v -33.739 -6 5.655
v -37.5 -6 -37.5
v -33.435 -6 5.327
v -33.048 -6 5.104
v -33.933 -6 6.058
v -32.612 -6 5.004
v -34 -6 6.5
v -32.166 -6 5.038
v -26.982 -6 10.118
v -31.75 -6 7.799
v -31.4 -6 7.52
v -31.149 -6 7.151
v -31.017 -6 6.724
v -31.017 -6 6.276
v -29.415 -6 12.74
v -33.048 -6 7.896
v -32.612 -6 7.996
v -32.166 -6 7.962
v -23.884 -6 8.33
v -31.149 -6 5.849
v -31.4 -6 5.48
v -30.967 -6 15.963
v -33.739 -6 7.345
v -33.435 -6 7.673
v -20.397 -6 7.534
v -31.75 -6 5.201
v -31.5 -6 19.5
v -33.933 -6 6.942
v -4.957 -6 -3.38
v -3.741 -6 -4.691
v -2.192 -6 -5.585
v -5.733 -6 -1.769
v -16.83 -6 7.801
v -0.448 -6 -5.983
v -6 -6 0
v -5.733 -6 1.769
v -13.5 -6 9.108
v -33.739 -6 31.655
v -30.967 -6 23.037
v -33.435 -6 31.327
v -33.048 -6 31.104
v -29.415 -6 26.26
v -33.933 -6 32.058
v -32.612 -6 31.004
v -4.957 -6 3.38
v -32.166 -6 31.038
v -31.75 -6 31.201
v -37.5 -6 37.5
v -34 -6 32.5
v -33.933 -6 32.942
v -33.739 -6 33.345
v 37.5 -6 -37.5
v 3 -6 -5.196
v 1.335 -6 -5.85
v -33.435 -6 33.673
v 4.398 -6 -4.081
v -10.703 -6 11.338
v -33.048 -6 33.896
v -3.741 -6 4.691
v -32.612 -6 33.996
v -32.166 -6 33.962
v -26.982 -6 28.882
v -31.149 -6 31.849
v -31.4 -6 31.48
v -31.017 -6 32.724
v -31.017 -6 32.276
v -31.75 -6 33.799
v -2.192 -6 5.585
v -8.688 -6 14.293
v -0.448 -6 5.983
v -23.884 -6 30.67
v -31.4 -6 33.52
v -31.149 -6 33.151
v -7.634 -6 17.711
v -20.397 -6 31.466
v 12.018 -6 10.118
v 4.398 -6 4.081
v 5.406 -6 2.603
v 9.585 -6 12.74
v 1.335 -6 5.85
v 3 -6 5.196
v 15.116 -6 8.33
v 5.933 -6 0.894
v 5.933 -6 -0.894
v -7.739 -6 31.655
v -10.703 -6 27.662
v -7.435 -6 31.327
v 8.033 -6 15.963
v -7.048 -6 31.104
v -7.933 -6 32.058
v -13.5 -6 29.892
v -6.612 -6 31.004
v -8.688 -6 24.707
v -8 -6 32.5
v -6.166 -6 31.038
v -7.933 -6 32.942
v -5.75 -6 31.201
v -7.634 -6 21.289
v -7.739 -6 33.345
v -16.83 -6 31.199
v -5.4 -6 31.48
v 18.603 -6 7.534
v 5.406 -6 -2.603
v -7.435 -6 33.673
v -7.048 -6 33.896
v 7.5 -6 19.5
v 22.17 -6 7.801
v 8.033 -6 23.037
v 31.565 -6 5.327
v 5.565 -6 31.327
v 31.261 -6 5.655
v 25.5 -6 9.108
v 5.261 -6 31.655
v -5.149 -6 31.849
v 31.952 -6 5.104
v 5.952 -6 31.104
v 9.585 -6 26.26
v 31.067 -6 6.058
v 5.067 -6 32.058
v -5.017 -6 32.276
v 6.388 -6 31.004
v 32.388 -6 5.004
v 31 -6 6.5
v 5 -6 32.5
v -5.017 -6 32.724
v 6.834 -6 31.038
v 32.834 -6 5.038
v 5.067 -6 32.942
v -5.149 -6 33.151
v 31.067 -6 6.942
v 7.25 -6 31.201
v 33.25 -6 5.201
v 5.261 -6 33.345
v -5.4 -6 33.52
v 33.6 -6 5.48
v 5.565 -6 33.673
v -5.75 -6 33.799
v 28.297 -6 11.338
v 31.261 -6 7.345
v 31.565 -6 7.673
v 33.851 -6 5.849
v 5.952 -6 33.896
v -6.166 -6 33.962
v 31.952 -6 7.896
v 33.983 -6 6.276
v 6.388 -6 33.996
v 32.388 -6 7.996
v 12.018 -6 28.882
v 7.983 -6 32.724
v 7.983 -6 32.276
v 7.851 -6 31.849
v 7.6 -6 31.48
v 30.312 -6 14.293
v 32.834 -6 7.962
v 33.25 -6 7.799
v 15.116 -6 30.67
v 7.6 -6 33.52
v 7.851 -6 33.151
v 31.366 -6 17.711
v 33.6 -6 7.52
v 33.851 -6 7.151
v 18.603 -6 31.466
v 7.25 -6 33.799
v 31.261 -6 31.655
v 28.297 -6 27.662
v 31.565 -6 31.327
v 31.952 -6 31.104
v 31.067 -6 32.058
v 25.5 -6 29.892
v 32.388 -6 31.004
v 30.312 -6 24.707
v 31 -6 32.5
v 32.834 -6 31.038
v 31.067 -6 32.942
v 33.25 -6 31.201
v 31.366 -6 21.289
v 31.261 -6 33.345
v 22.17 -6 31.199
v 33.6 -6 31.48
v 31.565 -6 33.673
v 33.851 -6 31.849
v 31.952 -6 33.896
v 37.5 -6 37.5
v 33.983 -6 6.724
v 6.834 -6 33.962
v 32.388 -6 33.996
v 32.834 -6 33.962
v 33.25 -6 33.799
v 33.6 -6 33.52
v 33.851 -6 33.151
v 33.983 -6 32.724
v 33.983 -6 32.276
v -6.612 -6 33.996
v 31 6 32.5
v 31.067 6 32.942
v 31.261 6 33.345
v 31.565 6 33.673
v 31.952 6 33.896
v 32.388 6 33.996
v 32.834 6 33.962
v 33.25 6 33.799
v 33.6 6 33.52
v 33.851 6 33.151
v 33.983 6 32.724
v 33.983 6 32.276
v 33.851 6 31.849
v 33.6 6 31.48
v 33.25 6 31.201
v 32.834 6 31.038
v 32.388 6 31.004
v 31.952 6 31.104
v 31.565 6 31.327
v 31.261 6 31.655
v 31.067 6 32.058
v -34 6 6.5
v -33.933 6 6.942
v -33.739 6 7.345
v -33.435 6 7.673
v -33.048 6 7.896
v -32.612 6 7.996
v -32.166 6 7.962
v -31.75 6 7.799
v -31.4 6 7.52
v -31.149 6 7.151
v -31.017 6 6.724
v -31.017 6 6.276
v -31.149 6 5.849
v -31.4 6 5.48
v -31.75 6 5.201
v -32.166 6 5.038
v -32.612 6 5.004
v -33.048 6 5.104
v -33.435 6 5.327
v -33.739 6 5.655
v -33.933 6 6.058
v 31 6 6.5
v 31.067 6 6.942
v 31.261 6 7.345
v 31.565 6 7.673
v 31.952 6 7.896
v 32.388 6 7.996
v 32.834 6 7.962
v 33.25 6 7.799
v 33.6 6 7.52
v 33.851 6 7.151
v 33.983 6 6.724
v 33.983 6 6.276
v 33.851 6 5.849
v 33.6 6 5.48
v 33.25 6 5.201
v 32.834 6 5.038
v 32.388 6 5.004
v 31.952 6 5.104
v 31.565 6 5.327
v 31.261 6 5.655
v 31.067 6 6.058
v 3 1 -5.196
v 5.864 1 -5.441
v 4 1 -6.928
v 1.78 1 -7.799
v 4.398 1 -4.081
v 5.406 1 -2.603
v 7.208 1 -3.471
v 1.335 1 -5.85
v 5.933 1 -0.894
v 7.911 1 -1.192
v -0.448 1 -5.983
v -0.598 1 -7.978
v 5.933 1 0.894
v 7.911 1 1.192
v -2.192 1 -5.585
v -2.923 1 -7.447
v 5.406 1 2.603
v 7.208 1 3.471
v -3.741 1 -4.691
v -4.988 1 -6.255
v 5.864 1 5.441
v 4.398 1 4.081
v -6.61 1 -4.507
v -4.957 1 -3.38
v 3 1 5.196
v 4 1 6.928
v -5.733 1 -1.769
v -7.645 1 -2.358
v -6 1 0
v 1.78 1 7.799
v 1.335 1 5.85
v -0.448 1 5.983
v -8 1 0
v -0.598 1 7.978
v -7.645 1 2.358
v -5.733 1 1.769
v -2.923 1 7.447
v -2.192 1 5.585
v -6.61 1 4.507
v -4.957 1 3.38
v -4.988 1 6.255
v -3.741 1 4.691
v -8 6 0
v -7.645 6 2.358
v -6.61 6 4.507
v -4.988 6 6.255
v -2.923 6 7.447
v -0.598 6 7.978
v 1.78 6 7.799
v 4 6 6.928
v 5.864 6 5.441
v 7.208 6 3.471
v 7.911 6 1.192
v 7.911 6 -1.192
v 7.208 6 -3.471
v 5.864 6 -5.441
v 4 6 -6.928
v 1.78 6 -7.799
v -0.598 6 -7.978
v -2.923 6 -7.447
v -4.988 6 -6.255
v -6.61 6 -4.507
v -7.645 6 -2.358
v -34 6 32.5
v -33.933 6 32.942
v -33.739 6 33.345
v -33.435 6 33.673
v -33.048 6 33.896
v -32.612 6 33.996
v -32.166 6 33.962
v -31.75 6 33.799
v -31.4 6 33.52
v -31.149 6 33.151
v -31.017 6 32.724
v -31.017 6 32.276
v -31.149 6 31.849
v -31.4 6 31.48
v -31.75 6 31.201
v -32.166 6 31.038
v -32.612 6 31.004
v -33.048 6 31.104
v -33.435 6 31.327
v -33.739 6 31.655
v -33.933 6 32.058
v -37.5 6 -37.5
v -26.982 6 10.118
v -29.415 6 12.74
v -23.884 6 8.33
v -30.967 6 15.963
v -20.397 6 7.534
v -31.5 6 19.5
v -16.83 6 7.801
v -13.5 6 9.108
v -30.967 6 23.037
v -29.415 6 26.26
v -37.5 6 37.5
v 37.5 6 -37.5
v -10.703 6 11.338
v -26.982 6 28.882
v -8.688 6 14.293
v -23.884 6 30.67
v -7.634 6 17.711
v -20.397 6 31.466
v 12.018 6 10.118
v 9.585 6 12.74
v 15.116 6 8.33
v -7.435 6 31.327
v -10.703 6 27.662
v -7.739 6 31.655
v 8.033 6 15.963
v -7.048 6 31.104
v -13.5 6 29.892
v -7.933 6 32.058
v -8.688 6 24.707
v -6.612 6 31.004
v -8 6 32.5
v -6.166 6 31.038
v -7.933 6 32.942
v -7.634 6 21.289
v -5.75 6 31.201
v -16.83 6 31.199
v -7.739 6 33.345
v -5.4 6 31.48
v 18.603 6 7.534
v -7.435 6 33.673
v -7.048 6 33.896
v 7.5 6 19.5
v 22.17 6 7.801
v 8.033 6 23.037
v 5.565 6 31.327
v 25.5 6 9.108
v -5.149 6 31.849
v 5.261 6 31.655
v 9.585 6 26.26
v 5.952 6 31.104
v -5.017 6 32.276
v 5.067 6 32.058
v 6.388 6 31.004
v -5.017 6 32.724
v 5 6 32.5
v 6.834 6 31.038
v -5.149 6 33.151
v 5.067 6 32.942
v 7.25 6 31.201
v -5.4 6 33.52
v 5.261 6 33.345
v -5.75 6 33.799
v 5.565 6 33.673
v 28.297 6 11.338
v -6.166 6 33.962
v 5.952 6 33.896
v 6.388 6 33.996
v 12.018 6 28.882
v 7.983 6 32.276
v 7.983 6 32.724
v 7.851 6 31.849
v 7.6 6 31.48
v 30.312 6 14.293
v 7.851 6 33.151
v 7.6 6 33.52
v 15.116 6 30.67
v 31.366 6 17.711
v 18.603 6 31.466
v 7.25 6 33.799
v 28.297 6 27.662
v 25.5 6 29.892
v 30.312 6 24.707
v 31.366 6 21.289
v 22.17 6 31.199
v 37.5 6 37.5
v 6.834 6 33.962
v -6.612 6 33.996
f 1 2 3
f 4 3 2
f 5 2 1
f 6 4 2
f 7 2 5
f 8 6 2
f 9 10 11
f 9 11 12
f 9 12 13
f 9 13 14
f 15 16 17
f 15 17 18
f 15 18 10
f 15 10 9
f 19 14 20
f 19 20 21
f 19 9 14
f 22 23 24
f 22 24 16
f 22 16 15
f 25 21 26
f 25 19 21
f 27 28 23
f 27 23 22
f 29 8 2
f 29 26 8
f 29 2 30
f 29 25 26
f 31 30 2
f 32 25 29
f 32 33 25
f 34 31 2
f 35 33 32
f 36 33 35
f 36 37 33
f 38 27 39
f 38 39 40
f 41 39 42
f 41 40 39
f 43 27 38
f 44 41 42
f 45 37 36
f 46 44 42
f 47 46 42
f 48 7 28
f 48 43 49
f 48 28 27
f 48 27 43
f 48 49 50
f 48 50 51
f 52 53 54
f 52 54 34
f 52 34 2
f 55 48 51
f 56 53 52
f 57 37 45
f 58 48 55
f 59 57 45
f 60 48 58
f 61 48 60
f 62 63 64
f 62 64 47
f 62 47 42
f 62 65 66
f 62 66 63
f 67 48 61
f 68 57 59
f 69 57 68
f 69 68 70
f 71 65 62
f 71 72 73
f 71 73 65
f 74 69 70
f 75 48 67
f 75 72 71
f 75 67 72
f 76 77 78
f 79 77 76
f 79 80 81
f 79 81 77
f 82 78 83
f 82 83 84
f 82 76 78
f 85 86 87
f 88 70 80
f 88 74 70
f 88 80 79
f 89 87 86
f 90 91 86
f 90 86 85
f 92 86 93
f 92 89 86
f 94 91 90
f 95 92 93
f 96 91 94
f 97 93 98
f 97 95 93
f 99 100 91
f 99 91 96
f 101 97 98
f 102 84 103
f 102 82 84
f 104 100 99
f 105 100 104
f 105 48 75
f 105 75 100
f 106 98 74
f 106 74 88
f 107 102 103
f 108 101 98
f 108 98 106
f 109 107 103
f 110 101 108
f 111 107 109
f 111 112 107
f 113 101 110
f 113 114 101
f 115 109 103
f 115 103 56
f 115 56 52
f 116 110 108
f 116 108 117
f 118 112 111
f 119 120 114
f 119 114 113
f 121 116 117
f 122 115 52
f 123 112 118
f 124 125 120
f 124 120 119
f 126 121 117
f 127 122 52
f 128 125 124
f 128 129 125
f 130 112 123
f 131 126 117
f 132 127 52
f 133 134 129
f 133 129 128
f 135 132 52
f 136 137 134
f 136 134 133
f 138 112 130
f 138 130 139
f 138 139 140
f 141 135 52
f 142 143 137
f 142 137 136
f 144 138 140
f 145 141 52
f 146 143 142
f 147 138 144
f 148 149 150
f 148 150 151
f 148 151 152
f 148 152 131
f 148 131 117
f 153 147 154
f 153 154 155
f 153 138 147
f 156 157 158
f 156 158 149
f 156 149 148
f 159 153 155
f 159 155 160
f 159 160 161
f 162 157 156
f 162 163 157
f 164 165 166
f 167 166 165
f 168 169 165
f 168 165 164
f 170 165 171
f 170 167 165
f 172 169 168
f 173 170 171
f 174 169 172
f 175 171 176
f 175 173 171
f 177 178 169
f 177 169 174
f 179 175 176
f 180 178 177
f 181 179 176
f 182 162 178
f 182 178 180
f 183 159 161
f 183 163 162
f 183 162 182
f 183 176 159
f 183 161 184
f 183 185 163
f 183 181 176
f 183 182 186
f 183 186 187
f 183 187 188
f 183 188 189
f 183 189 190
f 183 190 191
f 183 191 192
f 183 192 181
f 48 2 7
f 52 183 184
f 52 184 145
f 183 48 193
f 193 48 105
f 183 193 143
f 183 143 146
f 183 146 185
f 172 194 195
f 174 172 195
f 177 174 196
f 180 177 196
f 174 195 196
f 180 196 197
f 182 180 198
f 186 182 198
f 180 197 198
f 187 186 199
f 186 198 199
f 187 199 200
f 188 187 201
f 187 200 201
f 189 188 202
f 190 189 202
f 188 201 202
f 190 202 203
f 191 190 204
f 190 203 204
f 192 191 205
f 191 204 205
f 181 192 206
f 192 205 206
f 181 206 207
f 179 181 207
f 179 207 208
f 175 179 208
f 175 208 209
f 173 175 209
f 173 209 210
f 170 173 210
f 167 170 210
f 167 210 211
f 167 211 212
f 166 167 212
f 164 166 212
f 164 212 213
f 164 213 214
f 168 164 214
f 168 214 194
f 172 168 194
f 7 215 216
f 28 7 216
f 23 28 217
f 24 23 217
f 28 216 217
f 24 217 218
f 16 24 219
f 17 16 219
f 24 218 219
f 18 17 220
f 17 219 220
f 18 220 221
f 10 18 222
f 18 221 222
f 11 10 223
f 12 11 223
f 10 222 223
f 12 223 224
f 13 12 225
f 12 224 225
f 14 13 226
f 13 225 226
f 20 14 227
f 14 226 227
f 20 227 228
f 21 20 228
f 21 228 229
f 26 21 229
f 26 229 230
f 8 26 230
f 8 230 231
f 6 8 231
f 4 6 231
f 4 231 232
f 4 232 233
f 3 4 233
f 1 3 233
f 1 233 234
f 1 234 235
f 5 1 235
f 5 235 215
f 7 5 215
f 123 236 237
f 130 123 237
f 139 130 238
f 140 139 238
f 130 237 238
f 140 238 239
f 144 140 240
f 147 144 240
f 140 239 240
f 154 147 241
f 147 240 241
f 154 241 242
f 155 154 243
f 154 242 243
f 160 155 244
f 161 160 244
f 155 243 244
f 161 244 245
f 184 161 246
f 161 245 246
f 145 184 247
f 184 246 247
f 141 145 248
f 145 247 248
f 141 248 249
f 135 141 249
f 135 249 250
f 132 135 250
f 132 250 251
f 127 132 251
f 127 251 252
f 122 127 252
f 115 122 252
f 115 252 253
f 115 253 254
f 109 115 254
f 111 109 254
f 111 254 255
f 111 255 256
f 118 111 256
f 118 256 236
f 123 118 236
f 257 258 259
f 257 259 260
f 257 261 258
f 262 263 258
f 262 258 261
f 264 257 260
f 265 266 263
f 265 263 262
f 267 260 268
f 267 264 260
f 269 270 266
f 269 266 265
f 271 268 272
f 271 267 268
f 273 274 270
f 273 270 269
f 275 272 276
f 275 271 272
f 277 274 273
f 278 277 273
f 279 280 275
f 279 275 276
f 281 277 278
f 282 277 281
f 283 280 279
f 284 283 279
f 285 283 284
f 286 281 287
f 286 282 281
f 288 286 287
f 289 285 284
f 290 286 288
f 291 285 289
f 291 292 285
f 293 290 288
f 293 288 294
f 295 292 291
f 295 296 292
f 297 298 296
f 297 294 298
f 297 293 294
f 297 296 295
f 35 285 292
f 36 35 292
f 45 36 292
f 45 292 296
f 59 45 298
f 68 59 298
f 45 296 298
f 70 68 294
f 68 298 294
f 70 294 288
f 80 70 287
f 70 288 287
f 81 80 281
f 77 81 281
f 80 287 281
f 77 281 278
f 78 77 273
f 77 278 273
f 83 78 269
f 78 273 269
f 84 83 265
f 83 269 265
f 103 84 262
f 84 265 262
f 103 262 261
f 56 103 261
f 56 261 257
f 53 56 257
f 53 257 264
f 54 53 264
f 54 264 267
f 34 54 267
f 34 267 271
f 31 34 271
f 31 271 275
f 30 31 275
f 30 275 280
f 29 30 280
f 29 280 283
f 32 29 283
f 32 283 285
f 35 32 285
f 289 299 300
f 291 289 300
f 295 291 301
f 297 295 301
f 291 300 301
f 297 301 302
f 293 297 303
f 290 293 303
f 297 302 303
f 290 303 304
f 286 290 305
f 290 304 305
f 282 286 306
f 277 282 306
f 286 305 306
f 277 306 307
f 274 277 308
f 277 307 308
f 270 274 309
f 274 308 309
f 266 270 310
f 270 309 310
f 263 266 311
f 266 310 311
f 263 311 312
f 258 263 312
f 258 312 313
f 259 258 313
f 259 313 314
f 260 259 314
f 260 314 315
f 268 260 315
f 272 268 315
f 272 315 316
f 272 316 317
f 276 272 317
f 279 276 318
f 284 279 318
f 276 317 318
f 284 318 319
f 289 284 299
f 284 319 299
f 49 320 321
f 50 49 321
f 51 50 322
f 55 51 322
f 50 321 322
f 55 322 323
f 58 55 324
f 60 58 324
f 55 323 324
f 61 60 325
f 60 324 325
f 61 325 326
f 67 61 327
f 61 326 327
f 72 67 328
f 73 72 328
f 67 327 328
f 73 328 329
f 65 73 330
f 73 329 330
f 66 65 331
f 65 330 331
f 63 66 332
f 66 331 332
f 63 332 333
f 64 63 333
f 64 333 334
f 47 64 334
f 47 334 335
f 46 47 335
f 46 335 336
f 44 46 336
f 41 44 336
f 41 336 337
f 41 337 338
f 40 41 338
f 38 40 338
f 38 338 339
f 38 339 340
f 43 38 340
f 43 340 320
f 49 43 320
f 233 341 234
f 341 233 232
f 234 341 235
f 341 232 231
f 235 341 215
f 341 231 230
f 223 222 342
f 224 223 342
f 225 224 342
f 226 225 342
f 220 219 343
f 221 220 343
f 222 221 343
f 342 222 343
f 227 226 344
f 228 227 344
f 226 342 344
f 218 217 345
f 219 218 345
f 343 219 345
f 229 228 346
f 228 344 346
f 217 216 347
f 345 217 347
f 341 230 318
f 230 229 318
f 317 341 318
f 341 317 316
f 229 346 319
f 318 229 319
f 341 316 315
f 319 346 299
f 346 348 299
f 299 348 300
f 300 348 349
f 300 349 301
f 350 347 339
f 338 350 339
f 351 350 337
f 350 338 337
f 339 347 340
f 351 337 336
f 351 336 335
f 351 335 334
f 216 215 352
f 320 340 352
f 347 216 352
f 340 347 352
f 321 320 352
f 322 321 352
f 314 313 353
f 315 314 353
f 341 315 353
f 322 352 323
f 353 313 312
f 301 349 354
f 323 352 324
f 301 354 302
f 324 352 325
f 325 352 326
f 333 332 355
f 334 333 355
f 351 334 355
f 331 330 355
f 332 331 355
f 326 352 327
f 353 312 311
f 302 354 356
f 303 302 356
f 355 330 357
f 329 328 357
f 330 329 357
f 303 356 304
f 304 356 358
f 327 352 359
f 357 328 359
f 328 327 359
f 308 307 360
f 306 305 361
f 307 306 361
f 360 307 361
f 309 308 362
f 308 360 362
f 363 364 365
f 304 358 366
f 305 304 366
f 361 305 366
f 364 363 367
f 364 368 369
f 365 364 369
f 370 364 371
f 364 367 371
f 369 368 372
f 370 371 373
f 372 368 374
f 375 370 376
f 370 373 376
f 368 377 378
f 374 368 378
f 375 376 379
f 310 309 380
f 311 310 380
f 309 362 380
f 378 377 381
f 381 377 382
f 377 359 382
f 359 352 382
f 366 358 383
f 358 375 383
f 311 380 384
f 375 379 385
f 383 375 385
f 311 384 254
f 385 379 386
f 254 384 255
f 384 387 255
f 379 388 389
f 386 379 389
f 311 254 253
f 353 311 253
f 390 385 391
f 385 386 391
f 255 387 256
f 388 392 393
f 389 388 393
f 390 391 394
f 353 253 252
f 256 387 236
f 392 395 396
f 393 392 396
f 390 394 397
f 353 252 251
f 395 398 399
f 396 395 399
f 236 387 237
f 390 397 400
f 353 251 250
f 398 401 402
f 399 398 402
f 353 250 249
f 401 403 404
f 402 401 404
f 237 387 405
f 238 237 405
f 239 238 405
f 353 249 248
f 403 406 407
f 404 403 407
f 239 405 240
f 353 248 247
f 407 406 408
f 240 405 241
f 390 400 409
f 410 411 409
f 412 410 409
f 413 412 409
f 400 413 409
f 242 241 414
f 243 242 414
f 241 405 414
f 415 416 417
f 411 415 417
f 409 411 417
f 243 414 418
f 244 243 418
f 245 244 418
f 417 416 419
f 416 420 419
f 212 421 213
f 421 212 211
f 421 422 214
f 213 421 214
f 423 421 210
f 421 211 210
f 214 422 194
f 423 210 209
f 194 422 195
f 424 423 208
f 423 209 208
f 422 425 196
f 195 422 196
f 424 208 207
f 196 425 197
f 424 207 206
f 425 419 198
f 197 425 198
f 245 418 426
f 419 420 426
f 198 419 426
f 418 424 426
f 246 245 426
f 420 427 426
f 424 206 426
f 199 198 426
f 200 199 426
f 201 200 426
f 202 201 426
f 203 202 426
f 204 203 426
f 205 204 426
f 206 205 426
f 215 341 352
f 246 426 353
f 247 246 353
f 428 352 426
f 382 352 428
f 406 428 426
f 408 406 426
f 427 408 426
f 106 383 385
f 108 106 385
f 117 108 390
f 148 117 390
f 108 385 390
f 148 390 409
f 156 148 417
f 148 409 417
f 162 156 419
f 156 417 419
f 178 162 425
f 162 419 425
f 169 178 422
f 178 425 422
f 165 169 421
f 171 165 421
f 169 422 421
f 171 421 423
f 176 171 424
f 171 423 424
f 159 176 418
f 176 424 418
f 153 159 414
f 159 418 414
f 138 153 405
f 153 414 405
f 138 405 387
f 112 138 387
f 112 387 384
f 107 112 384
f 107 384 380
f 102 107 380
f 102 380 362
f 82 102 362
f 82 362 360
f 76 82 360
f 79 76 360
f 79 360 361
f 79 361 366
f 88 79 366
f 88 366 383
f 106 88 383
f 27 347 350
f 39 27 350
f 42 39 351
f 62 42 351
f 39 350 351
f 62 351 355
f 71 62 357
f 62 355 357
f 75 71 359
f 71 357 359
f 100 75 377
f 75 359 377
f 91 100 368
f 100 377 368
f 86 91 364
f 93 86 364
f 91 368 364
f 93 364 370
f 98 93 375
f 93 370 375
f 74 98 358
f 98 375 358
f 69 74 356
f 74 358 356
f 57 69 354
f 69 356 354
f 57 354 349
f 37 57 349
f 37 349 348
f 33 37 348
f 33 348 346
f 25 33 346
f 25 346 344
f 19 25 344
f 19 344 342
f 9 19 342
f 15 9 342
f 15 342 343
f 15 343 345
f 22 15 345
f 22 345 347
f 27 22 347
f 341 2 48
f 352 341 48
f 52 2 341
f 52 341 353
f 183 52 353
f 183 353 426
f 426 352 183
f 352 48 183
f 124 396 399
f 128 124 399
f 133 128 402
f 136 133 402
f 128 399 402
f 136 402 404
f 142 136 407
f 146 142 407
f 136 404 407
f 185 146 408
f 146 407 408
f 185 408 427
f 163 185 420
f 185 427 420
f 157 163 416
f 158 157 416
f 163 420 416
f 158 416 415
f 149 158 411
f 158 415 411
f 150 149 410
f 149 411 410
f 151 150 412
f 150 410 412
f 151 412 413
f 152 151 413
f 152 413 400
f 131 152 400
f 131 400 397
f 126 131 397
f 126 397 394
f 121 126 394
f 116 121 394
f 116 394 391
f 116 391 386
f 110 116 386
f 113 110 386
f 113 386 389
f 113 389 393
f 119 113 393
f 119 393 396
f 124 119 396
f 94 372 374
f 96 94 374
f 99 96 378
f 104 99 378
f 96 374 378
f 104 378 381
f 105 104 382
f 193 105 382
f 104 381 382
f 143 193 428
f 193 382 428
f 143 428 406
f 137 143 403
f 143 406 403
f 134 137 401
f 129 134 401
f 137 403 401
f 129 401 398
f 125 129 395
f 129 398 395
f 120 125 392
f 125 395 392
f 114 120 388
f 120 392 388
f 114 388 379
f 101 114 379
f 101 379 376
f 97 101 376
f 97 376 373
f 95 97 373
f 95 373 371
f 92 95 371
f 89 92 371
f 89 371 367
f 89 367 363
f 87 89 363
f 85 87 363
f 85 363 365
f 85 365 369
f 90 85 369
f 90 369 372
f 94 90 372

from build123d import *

# Parameters (mm, degrees)
F0_W     = 75
F0_H     = 75
F1_DEPTH = 6
F2_R     = 12
F2_R_2   = 1.5
F3_DEPTH = 12.001
F4_R     = 8
F5_DEPTH = 5
F6_R     = 6
F7_DEPTH = 7.001


with BuildPart() as f1:
    # F0 (on Front) → F1 (new body, symmetric)
    with BuildSketch(Plane.XZ):
        Rectangle(F0_W, F0_H)
    extrude(amount=F1_DEPTH, both=True)

    # F2 (on face) → F3 (cut, through all)
    with BuildSketch(Plane(origin=(0, 6, 0), x_dir=(-1, 0, 0), z_dir=(0, 1, 0))):
        with Locations((-19.5, 19.5)):
            Circle(F2_R)
        with Locations((-32.5, 32.5)):
            Circle(F2_R_2)
        with Locations((-32.5, 6.5)):
            Circle(F2_R_2)
        with Locations((-6.5, 32.5)):
            Circle(F2_R_2)
        with Locations((32.5, 6.5)):
            Circle(F2_R_2)
        with Locations((32.5, 32.5)):
            Circle(F2_R_2)
        with Locations((19.5, 19.5)):
            Circle(F2_R)
        with Locations((6.5, 32.5)):
            Circle(F2_R_2)
    extrude(amount=-F3_DEPTH, mode=Mode.SUBTRACT)

    # F4 (on face) → F5 (cut)
    with BuildSketch(Plane(origin=(0, 6, 0), x_dir=(-1, 0, 0), z_dir=(0, 1, 0))):
        Circle(F4_R)
    extrude(amount=-F5_DEPTH, mode=Mode.SUBTRACT)

    # F6 (on face) → F7 (cut, through all)
    with BuildSketch(Plane(origin=(0, 1, 0), x_dir=(-1, 0, 0), z_dir=(0, 1, 0))):
        Circle(F6_R)
    extrude(amount=-F7_DEPTH, mode=Mode.SUBTRACT)


solid = f1.part
